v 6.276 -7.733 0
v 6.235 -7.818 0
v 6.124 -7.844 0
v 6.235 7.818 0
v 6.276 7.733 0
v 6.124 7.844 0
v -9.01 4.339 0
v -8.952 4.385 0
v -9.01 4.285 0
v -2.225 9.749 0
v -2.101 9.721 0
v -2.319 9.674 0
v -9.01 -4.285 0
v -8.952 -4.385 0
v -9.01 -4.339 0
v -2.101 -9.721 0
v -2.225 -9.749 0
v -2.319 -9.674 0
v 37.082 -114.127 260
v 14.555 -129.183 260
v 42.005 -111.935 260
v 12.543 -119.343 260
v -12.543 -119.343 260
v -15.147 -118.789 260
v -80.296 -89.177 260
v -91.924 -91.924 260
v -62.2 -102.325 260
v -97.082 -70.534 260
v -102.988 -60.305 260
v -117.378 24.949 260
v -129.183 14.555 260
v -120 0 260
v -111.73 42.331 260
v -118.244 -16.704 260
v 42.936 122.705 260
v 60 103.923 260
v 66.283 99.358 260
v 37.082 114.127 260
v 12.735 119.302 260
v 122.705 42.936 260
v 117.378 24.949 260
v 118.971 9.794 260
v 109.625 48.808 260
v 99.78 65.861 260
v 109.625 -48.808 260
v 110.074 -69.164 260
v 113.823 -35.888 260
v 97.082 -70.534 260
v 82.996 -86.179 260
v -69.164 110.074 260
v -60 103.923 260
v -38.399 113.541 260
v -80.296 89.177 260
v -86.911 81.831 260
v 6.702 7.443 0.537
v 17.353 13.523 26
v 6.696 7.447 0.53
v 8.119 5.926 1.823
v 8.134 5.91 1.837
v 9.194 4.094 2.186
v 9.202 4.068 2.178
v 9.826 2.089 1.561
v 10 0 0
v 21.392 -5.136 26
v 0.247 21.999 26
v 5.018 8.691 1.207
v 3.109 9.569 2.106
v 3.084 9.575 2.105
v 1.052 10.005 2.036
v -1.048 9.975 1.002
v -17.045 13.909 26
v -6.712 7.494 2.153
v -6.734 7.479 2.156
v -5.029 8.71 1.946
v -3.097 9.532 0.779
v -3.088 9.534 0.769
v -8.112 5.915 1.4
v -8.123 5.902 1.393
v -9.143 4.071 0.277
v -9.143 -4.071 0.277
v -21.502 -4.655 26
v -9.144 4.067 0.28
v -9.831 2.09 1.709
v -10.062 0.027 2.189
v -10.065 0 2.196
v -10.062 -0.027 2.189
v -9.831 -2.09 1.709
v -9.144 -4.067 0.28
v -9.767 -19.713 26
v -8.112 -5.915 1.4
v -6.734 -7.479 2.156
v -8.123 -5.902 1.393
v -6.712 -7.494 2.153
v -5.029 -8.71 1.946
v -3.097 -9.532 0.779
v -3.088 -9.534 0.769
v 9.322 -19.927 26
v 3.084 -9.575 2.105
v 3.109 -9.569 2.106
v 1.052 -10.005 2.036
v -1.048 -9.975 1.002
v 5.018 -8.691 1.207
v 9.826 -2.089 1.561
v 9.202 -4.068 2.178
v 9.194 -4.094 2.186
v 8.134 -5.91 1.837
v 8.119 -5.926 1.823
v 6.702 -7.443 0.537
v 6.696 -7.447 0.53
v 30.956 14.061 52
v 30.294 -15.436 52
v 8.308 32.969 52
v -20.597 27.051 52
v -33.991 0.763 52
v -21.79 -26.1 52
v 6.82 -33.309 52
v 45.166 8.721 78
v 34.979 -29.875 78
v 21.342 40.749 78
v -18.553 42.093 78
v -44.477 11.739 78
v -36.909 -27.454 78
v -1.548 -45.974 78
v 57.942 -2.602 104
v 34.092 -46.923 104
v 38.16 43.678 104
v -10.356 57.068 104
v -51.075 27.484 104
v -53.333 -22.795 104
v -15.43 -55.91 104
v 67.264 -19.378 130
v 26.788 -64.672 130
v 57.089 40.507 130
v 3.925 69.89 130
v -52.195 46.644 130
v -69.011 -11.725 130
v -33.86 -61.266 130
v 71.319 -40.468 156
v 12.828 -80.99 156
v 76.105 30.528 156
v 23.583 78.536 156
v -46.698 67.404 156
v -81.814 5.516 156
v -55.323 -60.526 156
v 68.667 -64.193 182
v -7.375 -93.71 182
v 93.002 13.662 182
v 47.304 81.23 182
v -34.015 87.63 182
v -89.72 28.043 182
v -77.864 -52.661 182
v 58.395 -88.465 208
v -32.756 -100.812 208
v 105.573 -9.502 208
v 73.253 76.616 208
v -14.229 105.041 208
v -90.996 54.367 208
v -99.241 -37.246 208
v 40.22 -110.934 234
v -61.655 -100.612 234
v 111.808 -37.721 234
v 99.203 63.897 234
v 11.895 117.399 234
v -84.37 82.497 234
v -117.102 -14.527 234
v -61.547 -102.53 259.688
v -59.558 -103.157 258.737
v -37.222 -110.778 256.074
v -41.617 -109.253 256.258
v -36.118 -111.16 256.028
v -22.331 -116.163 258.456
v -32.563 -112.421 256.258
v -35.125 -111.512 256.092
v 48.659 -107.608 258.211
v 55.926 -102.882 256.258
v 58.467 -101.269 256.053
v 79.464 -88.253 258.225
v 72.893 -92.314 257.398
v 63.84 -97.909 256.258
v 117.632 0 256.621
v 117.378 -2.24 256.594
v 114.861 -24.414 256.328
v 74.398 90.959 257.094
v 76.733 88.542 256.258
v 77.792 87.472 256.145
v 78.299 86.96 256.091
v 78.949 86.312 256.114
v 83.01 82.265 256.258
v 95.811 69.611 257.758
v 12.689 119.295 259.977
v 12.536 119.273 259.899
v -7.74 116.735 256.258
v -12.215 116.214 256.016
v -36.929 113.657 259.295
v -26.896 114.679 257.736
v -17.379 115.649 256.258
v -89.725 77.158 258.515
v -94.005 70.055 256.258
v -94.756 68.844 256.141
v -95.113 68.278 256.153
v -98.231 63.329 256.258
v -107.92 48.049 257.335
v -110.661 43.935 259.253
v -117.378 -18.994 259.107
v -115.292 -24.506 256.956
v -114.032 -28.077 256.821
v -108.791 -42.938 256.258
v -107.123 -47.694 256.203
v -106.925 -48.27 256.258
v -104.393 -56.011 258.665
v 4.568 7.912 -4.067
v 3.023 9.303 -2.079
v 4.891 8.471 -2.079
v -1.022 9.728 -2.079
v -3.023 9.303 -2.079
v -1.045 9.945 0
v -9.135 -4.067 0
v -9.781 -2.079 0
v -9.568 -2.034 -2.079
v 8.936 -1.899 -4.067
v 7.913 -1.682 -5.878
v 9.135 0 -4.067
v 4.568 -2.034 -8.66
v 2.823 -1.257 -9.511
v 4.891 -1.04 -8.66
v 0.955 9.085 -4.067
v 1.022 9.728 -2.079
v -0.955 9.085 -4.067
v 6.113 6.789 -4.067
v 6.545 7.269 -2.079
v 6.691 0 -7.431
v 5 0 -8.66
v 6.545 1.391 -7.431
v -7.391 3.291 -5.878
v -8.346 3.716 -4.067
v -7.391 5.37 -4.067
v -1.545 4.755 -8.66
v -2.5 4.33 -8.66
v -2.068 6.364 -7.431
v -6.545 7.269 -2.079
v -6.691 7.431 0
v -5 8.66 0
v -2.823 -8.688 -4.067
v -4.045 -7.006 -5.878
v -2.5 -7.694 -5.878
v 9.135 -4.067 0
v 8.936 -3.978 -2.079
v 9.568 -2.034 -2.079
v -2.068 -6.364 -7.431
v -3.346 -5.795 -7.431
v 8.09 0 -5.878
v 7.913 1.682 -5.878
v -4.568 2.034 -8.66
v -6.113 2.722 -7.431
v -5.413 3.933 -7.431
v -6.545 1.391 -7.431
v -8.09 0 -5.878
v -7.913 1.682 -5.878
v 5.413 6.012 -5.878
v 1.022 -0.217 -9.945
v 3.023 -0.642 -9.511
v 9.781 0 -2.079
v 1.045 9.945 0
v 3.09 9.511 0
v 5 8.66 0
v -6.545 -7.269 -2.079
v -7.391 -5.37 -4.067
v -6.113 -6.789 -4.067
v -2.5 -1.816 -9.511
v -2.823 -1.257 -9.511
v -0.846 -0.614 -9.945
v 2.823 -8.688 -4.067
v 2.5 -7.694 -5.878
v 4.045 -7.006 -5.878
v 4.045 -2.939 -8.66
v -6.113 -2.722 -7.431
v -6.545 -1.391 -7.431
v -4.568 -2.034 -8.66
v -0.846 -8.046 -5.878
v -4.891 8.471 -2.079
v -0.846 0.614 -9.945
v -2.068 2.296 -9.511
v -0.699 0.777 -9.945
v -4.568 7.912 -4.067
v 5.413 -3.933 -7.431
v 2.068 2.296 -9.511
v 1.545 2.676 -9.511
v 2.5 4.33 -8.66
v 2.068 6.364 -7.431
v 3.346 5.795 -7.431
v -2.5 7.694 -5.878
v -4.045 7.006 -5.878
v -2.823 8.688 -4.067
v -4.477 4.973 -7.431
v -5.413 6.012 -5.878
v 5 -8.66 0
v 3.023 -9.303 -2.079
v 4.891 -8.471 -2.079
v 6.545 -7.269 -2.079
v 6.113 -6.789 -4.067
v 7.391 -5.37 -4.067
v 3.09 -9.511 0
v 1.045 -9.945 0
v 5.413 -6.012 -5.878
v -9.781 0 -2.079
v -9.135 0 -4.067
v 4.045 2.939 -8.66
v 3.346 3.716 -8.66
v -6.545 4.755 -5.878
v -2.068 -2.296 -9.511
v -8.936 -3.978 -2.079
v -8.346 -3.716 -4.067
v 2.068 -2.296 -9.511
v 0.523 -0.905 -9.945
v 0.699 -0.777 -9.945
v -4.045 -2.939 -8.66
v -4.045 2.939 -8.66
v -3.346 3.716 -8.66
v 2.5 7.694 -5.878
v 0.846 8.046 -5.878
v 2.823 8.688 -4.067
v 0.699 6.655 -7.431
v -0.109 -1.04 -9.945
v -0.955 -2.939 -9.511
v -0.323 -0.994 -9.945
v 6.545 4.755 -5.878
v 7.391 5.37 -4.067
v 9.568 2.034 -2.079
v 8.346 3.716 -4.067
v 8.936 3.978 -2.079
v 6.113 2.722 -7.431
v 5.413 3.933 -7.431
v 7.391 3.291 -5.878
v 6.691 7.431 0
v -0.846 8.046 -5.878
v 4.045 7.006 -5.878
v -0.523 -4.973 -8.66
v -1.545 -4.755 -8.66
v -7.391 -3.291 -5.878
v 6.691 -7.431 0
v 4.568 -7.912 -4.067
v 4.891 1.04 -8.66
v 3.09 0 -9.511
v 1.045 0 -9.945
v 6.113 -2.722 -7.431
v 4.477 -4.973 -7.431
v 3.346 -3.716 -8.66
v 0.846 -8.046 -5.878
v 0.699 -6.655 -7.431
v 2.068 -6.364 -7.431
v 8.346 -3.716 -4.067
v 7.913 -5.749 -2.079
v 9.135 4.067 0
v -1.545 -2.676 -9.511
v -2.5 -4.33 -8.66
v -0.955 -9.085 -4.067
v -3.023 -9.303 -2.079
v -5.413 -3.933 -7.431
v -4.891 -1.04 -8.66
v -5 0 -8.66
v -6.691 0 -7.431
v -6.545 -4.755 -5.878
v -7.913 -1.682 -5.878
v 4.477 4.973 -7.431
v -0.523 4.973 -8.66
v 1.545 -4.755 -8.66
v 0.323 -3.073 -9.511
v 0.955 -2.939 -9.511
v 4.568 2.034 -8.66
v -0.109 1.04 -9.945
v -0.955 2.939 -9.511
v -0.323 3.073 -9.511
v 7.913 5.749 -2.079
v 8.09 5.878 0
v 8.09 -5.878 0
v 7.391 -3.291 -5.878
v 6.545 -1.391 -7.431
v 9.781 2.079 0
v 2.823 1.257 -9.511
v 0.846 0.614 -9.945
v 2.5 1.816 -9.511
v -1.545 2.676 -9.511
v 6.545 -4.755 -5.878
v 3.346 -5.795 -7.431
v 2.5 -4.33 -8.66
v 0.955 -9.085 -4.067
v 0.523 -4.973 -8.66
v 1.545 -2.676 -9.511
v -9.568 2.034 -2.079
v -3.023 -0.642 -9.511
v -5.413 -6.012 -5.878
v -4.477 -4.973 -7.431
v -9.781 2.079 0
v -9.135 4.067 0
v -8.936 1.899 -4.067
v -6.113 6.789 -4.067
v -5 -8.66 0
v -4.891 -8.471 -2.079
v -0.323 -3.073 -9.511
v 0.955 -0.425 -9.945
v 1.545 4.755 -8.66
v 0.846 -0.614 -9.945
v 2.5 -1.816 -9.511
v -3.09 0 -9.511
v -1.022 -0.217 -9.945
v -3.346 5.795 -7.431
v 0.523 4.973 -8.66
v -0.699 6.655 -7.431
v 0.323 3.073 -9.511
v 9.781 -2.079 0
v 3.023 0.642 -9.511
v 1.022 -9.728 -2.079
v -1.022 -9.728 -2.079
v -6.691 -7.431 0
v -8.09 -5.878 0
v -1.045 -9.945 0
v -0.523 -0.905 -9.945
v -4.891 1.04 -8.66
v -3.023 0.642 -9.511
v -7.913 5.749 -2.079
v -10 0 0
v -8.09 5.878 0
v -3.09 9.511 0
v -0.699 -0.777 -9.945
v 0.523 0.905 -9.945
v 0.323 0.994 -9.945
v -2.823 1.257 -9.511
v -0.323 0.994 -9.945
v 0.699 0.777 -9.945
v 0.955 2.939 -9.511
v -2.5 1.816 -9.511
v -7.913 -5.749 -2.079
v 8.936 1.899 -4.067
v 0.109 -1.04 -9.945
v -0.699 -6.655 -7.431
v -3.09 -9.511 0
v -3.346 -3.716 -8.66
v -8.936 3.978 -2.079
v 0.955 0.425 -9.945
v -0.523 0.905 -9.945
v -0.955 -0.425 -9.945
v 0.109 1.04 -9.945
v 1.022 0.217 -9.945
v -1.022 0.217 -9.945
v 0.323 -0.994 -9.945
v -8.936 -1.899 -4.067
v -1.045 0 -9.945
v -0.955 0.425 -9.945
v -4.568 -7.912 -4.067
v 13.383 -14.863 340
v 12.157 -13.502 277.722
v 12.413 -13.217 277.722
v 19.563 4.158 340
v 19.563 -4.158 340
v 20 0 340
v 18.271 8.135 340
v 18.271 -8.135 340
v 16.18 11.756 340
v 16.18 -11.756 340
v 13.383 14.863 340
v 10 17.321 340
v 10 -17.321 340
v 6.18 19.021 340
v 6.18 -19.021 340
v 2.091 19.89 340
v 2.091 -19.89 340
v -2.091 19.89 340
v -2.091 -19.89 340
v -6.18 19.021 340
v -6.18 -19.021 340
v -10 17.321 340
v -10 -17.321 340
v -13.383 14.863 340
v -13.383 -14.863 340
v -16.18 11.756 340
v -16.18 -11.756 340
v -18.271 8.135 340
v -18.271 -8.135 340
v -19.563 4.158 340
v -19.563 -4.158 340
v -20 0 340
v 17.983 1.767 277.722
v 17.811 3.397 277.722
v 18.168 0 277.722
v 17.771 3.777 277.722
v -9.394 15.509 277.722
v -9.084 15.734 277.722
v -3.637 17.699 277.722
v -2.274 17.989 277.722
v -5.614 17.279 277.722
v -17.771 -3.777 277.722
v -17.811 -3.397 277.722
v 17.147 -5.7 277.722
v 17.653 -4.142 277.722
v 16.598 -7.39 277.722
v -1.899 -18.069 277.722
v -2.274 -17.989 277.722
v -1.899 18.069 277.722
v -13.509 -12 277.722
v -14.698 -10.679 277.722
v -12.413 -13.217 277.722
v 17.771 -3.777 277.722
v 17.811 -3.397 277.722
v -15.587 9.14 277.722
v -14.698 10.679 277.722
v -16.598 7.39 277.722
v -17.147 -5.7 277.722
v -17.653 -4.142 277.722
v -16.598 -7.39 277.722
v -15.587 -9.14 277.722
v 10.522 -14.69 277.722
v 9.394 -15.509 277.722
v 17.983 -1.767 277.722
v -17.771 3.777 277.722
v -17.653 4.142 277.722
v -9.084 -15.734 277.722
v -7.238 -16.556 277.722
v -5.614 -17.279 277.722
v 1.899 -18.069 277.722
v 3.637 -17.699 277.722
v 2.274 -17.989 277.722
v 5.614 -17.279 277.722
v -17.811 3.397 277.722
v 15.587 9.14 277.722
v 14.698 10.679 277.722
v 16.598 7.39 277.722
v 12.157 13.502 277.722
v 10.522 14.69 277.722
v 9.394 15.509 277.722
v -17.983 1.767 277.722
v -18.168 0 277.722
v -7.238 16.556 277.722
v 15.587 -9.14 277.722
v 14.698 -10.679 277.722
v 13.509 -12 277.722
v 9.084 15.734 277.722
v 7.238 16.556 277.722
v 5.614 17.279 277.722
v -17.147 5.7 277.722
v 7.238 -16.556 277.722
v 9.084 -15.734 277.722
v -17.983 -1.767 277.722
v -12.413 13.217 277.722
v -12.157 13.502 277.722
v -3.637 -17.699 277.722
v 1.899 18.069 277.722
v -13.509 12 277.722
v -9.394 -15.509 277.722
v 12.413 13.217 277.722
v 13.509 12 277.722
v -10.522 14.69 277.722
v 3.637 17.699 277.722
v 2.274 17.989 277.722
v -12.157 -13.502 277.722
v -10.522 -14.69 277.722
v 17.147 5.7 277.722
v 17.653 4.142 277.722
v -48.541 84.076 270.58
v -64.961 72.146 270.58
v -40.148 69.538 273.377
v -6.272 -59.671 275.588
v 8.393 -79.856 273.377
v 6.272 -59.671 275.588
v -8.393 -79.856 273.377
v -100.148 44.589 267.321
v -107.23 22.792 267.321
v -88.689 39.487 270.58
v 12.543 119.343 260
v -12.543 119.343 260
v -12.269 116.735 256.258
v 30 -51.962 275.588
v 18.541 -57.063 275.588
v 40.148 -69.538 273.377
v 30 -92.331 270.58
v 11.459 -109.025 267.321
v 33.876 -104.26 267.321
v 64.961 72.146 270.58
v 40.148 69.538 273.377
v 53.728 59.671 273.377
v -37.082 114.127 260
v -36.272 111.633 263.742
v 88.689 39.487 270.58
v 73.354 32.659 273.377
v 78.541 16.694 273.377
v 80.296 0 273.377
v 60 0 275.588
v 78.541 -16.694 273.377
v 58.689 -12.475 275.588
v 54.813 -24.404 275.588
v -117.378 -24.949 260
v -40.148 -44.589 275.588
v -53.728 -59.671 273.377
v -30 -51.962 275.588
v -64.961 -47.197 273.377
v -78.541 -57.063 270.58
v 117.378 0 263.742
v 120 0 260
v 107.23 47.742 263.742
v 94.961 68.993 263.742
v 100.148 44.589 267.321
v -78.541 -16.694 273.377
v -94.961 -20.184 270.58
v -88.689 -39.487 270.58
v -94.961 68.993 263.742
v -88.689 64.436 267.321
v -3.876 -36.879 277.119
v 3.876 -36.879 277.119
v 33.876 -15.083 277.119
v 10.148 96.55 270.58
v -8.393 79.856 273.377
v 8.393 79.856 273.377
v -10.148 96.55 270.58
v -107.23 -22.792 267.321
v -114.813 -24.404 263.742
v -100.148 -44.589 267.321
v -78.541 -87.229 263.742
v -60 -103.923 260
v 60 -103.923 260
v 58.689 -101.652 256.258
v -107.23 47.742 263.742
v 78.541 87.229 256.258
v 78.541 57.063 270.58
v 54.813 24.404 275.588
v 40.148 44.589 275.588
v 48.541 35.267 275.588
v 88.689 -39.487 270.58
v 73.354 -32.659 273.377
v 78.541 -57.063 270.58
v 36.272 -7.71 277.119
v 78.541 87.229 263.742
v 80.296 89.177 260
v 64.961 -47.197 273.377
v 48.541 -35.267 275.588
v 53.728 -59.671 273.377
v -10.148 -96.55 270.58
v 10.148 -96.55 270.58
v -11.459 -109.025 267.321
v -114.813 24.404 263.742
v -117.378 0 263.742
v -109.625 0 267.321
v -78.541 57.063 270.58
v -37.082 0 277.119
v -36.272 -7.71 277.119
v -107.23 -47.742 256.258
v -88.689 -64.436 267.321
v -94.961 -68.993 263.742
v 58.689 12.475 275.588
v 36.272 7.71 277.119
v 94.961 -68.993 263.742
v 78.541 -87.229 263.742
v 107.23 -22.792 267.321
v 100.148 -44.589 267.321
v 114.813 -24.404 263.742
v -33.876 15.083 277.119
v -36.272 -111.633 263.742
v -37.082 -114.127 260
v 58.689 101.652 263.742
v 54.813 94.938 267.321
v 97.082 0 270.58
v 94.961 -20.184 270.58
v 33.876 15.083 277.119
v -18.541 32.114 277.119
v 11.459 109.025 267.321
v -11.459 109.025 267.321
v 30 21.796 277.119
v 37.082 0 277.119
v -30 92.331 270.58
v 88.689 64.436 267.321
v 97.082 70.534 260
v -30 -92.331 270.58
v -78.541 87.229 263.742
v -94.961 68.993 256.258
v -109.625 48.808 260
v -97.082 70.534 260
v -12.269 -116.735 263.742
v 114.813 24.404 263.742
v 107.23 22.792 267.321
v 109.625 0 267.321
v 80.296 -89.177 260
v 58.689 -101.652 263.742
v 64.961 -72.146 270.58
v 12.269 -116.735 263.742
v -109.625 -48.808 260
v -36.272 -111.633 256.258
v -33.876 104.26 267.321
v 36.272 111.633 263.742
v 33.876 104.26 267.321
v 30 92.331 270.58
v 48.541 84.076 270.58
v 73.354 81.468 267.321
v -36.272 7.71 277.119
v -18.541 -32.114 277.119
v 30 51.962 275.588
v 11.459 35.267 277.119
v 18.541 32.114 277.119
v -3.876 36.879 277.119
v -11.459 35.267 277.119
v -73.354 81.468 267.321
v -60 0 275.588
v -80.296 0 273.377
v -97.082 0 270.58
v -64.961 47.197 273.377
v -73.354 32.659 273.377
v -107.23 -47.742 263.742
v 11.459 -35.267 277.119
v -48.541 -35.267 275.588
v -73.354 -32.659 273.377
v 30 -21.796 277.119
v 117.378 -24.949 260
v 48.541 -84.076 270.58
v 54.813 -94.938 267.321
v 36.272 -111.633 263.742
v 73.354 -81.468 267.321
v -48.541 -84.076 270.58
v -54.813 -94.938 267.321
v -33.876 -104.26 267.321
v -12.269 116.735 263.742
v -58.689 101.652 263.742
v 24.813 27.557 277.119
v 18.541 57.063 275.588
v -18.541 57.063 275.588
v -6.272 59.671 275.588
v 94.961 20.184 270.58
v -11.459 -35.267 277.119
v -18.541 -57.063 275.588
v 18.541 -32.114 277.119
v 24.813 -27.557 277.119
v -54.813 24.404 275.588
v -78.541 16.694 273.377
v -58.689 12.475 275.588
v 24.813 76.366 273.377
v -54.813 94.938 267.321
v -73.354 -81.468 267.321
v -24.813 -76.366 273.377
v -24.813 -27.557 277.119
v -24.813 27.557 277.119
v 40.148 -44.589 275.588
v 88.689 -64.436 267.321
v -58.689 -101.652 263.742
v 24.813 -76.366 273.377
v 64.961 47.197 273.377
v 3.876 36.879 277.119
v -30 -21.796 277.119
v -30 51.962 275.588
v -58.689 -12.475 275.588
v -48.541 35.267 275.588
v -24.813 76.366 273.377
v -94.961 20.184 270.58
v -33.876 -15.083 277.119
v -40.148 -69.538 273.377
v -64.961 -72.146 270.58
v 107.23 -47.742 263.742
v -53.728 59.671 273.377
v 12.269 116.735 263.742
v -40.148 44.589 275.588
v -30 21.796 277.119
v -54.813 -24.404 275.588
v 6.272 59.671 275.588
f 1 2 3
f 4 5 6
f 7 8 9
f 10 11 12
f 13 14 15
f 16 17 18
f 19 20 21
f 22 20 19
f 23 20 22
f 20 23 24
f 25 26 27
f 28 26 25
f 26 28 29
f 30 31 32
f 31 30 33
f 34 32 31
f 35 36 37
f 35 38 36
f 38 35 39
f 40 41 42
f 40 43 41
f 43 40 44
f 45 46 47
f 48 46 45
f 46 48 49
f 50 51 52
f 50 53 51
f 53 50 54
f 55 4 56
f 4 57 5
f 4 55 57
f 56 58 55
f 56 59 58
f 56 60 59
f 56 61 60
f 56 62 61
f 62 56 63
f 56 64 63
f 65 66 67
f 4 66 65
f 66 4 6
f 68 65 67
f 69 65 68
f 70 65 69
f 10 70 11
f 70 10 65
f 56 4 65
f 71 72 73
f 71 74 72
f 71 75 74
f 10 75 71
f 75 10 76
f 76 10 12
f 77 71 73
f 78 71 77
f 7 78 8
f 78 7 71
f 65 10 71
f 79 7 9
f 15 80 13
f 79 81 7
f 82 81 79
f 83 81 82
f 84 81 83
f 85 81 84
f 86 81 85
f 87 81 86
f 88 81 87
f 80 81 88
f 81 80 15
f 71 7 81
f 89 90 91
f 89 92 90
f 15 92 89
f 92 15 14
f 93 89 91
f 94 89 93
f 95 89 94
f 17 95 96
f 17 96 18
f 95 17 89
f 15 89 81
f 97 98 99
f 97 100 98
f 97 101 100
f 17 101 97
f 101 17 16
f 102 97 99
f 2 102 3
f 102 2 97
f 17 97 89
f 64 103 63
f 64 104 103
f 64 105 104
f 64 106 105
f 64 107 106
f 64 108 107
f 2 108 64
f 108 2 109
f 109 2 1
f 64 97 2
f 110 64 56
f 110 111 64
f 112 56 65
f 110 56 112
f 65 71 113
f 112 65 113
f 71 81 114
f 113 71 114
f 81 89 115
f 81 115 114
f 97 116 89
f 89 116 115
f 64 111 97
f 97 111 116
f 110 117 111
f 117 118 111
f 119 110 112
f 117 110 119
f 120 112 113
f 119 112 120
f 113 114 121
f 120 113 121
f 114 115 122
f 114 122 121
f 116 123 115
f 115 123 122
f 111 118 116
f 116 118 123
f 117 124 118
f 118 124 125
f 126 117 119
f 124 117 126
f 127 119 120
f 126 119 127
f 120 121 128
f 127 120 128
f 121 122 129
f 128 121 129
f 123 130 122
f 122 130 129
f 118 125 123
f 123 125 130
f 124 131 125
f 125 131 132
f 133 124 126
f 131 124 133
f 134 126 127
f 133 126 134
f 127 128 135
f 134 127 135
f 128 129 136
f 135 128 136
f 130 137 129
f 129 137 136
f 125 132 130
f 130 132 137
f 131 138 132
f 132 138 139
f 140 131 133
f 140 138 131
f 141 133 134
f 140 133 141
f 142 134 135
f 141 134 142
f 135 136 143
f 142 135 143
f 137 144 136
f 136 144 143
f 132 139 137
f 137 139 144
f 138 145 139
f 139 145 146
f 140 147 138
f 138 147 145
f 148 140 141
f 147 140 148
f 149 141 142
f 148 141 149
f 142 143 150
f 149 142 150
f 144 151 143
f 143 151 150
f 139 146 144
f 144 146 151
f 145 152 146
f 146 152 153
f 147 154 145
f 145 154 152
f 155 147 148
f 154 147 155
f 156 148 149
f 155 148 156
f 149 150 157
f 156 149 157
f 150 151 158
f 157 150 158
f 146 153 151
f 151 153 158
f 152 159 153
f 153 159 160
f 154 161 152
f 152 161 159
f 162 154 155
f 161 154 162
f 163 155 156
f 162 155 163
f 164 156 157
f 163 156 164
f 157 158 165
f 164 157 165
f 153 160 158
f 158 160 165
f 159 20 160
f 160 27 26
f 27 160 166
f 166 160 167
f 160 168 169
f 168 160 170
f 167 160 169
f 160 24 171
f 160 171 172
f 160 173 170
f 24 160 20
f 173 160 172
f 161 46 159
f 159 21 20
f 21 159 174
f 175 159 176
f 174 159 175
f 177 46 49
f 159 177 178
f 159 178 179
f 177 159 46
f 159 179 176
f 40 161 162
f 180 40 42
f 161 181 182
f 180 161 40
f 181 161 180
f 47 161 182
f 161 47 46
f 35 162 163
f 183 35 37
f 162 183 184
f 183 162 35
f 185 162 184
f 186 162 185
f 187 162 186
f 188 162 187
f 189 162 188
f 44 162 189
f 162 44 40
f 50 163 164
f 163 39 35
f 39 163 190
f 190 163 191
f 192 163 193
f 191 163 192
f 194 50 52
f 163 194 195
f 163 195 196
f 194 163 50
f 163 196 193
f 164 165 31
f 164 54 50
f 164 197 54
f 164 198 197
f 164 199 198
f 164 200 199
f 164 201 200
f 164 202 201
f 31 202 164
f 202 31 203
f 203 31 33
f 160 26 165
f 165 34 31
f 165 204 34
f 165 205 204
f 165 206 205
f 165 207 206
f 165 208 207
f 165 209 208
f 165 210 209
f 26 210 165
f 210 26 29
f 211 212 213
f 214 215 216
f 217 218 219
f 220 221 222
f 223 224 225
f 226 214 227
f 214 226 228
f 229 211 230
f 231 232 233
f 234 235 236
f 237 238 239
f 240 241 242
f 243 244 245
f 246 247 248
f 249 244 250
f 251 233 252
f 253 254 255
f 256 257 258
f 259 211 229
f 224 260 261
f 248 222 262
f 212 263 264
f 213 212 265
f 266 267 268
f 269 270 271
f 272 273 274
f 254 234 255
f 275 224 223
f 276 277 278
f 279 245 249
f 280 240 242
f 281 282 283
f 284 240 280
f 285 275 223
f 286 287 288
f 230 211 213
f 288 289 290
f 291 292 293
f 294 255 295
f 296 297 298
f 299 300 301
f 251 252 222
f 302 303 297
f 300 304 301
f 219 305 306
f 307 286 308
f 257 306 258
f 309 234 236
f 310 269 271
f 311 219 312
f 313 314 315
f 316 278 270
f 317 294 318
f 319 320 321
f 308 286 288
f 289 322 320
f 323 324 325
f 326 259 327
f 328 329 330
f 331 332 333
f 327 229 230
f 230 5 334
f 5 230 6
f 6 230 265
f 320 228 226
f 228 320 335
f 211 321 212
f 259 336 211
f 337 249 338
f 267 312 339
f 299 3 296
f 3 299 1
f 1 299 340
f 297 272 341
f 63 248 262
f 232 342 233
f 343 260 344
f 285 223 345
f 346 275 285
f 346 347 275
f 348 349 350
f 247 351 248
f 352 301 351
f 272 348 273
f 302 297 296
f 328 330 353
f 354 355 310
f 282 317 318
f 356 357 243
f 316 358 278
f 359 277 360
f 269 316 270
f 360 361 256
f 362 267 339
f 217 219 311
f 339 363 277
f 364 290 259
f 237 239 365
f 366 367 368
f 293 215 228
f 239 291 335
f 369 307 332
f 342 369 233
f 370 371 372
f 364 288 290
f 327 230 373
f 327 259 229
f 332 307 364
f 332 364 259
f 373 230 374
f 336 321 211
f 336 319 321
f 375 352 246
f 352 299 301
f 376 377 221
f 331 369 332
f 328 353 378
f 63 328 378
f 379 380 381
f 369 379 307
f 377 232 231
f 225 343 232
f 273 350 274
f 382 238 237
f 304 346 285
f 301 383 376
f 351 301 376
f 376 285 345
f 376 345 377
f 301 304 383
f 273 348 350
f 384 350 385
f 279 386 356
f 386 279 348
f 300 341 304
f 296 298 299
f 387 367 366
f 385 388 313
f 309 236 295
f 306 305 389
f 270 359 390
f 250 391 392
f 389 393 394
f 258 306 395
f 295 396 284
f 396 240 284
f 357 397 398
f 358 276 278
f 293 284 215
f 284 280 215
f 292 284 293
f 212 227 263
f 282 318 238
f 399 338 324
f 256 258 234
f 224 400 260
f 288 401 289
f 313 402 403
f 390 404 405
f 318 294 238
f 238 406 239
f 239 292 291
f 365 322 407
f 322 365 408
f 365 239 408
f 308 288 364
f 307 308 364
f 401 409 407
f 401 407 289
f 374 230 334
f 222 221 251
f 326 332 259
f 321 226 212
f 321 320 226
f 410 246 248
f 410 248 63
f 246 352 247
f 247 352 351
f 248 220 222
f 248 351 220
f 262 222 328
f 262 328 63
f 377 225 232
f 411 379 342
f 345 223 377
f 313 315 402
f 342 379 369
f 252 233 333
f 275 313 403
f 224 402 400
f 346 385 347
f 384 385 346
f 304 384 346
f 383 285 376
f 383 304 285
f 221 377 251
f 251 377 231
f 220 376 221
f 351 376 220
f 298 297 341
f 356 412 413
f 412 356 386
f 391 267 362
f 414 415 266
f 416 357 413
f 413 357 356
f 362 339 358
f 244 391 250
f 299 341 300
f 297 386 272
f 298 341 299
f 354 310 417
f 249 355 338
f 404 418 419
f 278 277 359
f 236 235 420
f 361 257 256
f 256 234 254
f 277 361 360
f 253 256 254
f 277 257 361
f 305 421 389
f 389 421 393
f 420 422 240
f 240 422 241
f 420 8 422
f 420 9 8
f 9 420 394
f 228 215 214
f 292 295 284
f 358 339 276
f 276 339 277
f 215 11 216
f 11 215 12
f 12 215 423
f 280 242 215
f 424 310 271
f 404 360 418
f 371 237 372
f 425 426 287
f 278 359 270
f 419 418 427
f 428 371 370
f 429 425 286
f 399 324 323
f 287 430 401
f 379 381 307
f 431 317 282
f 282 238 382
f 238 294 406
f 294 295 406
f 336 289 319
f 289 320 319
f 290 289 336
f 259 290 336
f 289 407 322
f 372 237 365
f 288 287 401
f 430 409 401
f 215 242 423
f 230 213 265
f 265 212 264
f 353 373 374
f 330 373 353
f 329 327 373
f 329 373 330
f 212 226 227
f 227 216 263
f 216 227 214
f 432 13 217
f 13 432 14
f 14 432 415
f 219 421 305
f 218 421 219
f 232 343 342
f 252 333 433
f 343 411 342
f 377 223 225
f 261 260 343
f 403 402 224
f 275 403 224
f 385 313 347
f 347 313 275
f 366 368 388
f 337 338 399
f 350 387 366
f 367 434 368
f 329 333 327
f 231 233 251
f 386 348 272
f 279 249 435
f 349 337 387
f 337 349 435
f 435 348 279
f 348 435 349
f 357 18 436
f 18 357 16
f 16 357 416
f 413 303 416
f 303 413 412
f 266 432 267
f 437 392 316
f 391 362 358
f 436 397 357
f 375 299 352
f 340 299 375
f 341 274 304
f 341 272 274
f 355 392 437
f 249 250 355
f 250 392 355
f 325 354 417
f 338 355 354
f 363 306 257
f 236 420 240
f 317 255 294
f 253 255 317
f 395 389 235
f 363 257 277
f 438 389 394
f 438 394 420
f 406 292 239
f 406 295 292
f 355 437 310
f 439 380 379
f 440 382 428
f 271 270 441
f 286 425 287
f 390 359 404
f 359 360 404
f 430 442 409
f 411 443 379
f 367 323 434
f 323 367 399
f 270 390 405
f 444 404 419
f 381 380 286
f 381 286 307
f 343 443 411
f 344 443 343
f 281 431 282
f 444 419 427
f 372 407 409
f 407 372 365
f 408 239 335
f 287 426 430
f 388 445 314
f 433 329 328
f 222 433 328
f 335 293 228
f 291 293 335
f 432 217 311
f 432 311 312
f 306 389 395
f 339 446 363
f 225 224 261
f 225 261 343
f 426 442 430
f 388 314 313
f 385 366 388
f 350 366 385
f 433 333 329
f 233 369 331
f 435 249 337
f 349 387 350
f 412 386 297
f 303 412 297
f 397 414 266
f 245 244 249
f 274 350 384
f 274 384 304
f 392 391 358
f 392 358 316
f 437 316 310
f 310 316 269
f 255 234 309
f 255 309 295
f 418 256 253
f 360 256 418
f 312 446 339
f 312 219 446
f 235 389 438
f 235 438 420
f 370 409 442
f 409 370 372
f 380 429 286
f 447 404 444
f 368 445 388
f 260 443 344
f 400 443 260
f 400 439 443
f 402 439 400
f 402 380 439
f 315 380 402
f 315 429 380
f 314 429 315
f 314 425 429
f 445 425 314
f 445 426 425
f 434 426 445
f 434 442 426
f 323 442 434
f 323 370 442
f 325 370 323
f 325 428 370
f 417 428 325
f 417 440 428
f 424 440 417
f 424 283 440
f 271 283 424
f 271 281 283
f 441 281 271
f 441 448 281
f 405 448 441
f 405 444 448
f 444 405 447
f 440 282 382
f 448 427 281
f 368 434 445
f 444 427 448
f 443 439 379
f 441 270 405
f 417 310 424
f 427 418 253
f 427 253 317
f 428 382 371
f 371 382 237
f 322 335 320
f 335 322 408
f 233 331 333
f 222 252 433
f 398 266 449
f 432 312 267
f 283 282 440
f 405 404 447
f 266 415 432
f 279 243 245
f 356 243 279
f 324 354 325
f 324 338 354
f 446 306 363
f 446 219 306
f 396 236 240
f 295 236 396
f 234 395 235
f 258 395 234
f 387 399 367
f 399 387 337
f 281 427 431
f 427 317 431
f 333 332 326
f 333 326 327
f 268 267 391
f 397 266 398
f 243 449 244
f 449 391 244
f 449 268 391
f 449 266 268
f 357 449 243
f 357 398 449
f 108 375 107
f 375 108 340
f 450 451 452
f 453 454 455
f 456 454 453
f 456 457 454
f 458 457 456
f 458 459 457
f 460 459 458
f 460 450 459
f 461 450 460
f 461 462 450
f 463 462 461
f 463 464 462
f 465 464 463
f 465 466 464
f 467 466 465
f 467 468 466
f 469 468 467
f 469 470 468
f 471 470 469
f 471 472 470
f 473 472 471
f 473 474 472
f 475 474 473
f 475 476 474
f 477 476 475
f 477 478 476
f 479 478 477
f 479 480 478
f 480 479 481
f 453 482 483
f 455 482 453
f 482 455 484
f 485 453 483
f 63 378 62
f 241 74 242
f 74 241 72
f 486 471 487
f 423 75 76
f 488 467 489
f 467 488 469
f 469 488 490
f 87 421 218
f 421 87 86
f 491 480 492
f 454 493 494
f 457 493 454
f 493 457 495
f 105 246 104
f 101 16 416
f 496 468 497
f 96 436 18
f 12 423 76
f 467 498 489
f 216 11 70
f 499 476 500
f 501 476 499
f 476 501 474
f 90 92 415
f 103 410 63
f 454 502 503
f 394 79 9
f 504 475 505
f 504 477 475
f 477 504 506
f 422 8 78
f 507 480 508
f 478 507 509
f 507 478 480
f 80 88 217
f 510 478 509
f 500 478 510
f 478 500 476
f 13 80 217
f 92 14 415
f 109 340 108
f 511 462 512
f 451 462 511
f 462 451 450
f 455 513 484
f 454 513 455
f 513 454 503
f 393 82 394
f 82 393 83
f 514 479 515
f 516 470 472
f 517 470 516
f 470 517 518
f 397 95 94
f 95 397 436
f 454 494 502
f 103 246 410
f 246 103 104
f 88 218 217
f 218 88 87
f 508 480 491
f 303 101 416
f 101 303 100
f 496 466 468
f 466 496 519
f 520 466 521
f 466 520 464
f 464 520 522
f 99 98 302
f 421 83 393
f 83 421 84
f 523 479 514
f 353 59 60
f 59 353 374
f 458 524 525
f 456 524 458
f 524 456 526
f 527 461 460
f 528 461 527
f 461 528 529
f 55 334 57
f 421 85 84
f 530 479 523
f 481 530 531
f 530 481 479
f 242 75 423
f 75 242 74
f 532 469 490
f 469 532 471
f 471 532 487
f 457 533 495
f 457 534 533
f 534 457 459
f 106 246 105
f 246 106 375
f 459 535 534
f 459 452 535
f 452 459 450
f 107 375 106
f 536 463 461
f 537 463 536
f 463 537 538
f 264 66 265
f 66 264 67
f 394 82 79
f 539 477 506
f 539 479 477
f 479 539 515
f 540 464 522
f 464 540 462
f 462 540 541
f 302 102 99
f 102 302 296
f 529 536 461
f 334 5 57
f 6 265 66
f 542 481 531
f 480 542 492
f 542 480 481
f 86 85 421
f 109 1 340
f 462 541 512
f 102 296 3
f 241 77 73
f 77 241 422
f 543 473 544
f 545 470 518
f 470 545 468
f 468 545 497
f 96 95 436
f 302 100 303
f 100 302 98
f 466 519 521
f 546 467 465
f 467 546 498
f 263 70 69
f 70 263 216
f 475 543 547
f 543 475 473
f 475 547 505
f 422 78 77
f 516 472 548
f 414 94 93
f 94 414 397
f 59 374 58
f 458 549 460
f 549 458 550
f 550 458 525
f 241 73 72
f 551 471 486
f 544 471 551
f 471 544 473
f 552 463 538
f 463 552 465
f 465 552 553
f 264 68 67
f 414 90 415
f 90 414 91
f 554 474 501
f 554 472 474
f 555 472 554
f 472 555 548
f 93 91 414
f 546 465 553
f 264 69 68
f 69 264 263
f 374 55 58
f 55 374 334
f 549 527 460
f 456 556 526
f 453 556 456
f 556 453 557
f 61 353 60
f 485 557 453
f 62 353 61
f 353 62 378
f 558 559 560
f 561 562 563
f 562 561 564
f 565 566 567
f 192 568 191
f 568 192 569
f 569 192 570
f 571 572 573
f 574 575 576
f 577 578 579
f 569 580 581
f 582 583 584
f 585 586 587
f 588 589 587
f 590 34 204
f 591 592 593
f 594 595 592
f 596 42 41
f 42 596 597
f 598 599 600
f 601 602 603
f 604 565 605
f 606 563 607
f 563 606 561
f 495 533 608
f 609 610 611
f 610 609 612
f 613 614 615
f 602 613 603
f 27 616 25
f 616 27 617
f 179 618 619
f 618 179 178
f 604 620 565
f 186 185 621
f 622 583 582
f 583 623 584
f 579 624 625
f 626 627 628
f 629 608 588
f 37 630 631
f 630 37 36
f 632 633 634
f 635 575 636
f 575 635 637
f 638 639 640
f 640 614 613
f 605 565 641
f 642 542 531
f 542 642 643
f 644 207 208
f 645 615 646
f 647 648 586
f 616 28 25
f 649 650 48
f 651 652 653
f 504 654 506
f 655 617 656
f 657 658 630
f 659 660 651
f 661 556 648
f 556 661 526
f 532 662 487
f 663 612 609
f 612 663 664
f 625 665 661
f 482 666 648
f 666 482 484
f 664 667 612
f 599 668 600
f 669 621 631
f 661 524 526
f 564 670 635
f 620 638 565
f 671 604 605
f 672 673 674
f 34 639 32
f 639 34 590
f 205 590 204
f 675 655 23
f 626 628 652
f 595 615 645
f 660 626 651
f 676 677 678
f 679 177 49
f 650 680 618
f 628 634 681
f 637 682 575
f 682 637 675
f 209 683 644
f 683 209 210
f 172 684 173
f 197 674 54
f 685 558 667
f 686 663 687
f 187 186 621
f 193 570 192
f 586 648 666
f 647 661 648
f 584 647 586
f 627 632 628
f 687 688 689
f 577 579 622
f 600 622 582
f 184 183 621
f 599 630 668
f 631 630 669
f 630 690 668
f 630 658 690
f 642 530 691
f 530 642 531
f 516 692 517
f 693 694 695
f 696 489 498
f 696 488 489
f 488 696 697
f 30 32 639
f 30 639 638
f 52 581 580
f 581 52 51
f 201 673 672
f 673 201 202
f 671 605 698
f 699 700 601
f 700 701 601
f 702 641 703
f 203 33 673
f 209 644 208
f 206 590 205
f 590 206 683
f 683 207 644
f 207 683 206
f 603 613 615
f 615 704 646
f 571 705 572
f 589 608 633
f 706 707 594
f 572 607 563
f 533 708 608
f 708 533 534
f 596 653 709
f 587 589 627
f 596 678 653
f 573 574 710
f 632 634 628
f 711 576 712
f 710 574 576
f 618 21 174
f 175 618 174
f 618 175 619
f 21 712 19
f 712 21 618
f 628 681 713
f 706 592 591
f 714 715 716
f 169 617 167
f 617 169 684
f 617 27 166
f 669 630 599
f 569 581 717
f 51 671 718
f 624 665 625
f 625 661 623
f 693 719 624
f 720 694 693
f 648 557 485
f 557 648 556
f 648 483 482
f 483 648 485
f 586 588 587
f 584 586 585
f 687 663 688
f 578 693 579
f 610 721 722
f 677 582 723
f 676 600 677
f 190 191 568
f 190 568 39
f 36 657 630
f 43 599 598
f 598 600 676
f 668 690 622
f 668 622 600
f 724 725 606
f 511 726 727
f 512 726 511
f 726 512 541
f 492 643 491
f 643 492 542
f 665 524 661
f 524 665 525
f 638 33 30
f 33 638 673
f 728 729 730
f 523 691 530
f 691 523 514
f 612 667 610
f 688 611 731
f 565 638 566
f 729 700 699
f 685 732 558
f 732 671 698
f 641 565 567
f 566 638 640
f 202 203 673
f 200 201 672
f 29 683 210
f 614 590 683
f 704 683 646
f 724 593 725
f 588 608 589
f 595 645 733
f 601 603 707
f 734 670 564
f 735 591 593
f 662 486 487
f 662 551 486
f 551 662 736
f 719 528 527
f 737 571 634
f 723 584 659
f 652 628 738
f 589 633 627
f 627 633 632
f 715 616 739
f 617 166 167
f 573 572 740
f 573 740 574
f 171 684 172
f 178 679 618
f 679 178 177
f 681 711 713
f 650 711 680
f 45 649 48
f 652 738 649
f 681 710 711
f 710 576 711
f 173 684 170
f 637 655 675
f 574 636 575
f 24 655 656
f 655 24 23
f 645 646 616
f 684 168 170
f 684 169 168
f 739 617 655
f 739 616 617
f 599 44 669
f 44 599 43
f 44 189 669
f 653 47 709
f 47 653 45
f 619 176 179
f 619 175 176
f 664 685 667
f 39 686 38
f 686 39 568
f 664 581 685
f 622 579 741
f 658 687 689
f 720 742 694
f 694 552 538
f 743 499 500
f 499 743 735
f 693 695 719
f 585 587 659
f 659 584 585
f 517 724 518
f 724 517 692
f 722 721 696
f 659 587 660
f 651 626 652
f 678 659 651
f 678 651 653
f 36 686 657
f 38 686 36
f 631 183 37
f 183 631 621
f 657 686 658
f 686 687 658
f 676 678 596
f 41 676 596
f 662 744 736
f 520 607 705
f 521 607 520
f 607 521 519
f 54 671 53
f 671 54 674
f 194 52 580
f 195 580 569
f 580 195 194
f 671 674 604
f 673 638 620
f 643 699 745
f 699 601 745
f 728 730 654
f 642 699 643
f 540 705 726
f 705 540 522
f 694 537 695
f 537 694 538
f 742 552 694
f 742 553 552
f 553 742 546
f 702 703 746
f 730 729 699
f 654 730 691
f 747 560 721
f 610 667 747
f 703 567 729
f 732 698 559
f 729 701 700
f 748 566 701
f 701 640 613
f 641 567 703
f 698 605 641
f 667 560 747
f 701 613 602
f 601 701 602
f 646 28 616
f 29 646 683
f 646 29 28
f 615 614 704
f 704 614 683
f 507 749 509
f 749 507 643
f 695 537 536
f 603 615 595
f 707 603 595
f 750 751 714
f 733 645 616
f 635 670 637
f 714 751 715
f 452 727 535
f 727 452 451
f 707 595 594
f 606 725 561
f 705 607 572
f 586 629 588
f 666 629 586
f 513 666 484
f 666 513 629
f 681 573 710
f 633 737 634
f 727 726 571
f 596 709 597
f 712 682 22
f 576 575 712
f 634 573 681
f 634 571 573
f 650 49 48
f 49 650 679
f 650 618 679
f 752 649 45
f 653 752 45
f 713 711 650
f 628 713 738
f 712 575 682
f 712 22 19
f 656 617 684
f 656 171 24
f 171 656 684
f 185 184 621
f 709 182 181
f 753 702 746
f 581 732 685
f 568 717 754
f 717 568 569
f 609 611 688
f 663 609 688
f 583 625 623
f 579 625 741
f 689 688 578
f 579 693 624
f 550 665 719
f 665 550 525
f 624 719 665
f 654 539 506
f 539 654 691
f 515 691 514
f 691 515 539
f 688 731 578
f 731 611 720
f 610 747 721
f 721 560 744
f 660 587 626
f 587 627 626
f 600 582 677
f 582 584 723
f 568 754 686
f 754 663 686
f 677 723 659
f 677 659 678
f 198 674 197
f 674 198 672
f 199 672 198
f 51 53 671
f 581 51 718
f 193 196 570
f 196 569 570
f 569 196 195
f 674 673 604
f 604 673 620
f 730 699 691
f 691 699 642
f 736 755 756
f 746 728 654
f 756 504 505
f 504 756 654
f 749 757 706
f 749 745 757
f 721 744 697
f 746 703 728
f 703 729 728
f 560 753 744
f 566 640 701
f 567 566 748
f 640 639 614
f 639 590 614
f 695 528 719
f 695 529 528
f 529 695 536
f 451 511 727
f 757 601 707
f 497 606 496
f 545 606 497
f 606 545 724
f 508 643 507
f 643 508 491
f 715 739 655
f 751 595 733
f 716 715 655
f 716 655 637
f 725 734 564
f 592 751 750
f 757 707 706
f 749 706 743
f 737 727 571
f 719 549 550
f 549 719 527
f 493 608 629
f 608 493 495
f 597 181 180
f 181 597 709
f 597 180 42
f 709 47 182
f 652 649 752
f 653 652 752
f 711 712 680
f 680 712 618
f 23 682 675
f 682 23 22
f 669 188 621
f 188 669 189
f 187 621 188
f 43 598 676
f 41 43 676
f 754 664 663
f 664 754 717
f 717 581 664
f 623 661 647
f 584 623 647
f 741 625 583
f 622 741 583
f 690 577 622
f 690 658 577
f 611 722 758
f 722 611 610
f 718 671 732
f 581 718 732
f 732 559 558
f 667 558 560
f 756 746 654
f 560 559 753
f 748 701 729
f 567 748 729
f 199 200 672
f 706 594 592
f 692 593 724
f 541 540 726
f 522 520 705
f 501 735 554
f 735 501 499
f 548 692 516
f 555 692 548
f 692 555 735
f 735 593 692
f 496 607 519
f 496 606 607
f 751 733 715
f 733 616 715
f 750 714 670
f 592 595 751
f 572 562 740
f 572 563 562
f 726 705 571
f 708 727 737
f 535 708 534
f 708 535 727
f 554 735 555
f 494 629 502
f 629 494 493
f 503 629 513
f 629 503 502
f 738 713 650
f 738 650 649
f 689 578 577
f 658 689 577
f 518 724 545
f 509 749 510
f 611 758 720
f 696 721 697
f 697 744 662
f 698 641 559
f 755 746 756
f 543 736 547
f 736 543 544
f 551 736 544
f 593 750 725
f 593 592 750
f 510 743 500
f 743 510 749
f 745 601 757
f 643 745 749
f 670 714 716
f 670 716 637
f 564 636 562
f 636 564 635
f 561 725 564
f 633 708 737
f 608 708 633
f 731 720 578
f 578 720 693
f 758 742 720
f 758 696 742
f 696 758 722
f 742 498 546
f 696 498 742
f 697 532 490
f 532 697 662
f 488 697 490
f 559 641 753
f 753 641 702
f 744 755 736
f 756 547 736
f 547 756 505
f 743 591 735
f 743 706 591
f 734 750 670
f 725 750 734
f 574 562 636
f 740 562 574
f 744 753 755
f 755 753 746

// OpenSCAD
radius=50;
sides=7;
twist=135;
topscale=13;
slices=10;
wholescale=1;
//base
scale(wholescale){
scale(.2){
union(){
linear_extrude(height=1300, twist=twist, scale=topscale, slices=slices, radius=radius)
    circle(radius, $fn=sides, twist, scale, slices);   
sphere(radius);
}
cylinder(1700,50,100);
translate([0,0,1300])
scale([1,1,.15])
sphere(600);
}
}
